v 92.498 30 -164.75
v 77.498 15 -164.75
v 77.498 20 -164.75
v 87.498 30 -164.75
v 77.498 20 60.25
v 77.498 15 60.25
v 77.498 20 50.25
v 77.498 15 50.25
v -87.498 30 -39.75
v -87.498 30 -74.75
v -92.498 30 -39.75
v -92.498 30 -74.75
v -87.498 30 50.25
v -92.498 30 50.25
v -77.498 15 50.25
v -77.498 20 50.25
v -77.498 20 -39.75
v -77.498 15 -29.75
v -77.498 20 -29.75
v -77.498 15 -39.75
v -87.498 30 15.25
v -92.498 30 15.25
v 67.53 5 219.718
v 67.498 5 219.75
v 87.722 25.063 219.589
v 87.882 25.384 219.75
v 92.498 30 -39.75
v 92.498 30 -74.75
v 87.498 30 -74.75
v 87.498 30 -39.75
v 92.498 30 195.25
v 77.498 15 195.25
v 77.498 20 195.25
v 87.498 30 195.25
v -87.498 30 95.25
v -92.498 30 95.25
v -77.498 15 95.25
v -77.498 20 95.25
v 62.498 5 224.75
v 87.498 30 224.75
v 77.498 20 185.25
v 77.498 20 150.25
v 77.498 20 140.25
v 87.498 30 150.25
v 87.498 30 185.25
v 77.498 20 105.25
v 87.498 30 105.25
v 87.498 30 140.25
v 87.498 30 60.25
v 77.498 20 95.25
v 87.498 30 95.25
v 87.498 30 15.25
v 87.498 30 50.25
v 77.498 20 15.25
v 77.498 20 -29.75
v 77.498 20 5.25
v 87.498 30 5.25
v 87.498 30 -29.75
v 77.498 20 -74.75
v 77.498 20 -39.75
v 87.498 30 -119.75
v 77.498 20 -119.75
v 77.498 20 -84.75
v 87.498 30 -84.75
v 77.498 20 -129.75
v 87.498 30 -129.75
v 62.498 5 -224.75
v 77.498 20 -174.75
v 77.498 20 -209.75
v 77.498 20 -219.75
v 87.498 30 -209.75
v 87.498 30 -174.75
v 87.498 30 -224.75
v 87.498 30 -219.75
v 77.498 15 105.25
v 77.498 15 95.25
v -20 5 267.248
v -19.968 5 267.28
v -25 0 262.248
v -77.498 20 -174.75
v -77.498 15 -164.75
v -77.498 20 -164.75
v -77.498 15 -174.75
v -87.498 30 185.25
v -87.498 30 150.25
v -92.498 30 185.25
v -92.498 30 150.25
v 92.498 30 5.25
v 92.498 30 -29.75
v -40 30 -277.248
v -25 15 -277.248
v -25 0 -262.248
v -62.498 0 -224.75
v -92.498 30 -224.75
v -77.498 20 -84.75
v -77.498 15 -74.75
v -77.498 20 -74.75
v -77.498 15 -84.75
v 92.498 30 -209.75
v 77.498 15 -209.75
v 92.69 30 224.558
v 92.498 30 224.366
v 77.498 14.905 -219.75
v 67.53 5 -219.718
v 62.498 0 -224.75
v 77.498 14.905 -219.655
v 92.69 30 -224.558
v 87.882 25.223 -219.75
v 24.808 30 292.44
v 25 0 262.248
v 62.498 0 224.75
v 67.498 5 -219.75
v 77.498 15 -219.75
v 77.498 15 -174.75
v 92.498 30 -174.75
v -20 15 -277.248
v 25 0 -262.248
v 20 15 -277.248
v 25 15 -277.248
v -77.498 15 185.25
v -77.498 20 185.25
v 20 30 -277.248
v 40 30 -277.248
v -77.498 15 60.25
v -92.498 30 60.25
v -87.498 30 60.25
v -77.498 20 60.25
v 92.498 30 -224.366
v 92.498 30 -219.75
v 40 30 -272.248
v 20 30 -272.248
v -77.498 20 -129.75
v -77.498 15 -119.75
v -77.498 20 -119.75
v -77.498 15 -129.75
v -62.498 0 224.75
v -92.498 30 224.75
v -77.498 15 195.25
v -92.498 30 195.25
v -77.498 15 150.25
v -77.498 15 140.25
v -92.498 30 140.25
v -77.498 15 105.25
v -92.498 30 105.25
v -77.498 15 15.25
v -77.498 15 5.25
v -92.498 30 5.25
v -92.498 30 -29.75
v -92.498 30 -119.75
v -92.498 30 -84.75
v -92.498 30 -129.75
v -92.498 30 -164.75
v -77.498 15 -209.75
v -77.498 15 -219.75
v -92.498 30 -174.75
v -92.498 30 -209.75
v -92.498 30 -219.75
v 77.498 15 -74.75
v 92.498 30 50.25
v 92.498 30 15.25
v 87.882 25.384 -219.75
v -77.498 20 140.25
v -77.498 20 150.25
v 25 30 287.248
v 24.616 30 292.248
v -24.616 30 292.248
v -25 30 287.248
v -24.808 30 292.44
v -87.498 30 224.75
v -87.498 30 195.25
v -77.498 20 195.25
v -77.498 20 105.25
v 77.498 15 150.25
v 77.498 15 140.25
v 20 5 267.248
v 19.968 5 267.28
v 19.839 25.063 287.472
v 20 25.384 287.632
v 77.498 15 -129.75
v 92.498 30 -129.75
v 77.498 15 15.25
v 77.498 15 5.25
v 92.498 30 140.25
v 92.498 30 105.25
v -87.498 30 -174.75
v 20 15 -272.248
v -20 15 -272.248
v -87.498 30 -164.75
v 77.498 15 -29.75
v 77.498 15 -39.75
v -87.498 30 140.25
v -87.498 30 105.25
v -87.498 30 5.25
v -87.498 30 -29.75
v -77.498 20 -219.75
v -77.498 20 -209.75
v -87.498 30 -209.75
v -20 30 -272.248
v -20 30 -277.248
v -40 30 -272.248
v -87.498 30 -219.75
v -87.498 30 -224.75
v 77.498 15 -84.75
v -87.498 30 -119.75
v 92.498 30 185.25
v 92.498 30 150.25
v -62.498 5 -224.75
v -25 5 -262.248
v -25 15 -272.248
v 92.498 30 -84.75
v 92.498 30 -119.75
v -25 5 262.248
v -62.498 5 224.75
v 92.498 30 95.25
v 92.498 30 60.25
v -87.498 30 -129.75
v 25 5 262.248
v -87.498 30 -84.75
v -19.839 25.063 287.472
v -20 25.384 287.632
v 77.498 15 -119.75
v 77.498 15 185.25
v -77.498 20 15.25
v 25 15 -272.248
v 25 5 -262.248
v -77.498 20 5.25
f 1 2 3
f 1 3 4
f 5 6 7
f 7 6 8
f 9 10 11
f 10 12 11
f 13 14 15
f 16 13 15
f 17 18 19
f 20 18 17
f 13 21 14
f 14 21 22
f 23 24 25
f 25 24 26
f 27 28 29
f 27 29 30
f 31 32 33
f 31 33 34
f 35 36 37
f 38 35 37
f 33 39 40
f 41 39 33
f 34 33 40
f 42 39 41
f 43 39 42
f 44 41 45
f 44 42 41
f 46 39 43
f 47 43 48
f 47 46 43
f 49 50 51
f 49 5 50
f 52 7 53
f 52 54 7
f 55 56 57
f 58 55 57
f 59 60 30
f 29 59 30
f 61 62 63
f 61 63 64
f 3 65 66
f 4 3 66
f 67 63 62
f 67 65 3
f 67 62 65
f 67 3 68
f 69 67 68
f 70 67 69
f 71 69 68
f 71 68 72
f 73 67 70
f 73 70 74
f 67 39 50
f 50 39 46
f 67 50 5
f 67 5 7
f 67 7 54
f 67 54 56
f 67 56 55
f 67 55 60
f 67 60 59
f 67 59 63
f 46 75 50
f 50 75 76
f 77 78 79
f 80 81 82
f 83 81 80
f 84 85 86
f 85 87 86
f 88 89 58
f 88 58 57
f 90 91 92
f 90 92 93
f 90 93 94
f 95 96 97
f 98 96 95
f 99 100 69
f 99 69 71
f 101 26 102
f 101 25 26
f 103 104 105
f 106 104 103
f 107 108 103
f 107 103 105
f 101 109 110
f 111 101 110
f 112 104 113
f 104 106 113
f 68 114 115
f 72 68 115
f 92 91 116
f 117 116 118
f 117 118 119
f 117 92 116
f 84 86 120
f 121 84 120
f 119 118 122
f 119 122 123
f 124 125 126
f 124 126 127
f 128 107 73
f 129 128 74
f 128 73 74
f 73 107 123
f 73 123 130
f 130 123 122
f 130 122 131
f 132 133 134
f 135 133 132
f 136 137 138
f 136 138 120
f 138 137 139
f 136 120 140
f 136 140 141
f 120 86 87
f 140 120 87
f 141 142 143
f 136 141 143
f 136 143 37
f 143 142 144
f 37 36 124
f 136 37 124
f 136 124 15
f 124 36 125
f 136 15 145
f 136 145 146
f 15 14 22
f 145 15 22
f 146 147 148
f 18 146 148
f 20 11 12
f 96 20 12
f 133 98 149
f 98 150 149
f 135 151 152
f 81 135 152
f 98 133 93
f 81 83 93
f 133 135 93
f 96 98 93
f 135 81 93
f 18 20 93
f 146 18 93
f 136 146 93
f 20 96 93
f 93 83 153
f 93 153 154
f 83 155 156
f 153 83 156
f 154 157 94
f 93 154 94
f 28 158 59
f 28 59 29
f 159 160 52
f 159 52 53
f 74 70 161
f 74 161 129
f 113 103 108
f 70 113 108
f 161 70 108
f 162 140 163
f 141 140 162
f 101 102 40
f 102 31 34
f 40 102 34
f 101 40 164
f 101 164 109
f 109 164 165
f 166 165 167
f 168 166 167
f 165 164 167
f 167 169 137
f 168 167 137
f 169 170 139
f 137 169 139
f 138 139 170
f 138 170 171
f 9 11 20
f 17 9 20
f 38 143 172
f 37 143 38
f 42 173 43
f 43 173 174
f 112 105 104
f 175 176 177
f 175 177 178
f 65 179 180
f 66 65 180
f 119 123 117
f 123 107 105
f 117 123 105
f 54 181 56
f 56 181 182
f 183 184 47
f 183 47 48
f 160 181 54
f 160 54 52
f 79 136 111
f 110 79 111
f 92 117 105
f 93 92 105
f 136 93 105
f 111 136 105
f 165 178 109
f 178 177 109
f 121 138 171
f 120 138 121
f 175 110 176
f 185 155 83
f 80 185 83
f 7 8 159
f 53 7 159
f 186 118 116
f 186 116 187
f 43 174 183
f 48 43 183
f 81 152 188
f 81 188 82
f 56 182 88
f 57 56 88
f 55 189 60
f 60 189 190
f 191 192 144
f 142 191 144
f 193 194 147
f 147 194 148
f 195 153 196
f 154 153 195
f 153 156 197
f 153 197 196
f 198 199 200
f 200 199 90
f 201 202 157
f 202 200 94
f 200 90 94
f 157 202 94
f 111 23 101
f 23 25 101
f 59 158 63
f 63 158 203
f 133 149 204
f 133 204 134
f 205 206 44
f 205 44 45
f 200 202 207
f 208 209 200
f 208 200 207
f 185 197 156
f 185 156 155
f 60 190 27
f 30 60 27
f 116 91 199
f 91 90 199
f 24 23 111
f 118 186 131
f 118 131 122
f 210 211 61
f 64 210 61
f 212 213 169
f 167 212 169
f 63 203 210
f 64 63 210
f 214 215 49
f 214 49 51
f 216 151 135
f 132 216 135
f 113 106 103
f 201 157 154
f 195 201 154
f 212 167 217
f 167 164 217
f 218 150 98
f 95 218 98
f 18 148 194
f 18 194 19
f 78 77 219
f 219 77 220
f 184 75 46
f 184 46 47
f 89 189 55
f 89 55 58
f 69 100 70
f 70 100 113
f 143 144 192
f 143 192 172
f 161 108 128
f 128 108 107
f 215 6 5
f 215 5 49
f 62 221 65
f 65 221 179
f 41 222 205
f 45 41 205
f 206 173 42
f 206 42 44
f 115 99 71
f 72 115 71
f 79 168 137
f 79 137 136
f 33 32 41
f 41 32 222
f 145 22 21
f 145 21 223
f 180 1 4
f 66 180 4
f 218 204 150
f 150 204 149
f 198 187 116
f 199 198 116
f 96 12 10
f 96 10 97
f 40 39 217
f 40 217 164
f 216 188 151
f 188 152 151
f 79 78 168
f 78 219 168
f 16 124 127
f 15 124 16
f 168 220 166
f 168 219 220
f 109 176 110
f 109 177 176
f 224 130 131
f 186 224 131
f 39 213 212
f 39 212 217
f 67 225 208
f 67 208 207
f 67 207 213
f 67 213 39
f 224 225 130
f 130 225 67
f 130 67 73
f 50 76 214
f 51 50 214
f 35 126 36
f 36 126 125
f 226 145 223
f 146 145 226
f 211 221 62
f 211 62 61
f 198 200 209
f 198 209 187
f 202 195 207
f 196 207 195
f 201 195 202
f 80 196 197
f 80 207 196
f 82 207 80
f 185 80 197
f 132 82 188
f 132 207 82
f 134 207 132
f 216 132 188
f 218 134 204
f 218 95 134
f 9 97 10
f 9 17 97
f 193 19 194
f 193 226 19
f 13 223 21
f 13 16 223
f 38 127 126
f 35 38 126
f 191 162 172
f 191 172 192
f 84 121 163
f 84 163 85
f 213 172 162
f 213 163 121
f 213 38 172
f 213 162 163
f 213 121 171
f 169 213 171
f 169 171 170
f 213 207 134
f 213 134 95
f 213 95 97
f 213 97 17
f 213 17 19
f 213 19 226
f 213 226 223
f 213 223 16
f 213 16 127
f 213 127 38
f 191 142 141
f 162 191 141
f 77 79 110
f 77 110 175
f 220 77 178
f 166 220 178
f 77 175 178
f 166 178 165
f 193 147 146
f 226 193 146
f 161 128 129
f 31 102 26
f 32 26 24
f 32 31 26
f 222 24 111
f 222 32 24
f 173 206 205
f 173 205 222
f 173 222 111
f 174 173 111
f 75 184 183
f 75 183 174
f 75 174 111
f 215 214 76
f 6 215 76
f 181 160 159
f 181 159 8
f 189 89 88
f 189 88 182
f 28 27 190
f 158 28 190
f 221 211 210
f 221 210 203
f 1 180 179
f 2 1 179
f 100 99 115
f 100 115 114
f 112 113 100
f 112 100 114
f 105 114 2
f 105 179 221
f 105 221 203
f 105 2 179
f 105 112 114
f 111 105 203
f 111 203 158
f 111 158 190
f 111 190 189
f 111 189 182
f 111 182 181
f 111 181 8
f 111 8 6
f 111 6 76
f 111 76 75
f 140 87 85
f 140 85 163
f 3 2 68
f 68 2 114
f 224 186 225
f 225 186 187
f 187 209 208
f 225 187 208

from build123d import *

# Parameters (mm, degrees)
BOSS_EXTRUDE1_DEPTH     = 5
BOSS_EXTRUDE2_DEPTH     = 224.75
BOSS_EXTRUDE3_DEPTH     = 25
SKETCH7_W               = 5
SKETCH7_H               = 5
BOSS_EXTRUDE5_DEPTH     = 15
BOSS_EXTRUDE6_DEPTH     = 50
BOSS_EXTRUDE7_DEPTH     = 48
BOSS_EXTRUDE8_DEPTH     = 48
BOSS_EXTRUDE9_DEPTH     = 48
CUT_EXTRUDE1_DEPTH      = 95.104275362
CUT_EXTRUDE1_DEPTH_BACK = 93.6900618
SKETCH20_W              = 50
SKETCH20_H              = 48.112885627
CUT_EXTRUDE2_DEPTH      = 105
CUT_EXTRUDE3_DEPTH      = 105
BOSS_EXTRUDE11_DEPTH    = 5
CUT_EXTRUDE4_DEPTH      = 293.4400618
CUT_EXTRUDE4_DEPTH_BACK = 278.247872606
CUT_EXTRUDE5_DEPTH      = 29
SKETCH25_W              = 15
SKETCH25_H              = 10
CUT_EXTRUDE6_DEPTH      = 26
CUT_EXTRUDE6_DEPTH_BACK = 6


with BuildPart() as part:
    # Sketch1 → Boss-Extrude1 (new body)
    with BuildSketch(Plane(origin=(0, 0, 0), x_dir=(1, 0, 0), z_dir=(0, 1, 0))):
        Polygon((62.497872606, -224.75), (62.497872606, 224.75), (25, 262.247872606), (-25, 262.247872606), (-62.497872606, 224.75), (-62.497872606, -224.75), (-25, -262.247872606), (25, -262.247872606), align=None)
    extrude(amount=BOSS_EXTRUDE1_DEPTH)

    # Sketch3 → Boss-Extrude2 (add, symmetric)
    with BuildSketch(Plane(origin=(0, 0, 0), x_dir=(0, -1, 0), z_dir=(0, 0, 1))):
        Polygon((0, 62.497872606), (-5, 62.497872606), (-30, 87.497872606), (-30, 92.497872606), align=None)
        Polygon((-30, -87.497872606), (-30, -92.497872606), (0, -62.497872606), (-5, -62.497872606), align=None)
    extrude(amount=BOSS_EXTRUDE2_DEPTH, both=True)

    # Sketch6 → Boss-Extrude3 (add, symmetric)
    with BuildSketch(Plane(origin=(0, 0, 0), x_dir=(0, -1, 0), z_dir=(-1, 0, 0))):
        Polygon((0, 262.247872606), (-30, 292.247872606), (-30, 287.247872606), (-5, 262.247872606), align=None)
        Polygon((0, -262.247872606), (-15, -277.247872606), (-15, -272.247872606), (-5, -262.247872606), align=None)
    extrude(amount=BOSS_EXTRUDE3_DEPTH, both=True)

    # Sketch7 → Boss-Extrude5 (add)
    with BuildSketch(Plane(origin=(0, 15, 0), x_dir=(1, 0, 0), z_dir=(0, 1, 0))):
        with Locations((-22.5, 274.747872606)):
            Rectangle(SKETCH7_W, SKETCH7_H)
        with Locations((22.5, 274.747872606)):
            Rectangle(SKETCH7_W, SKETCH7_H)
    extrude(amount=BOSS_EXTRUDE5_DEPTH)

    # Sketch10 → Boss-Extrude6 (add, symmetric)
    with BuildSketch(Plane(origin=(99.875, 0, -99.875), x_dir=(0, -1, 0), z_dir=(0.707106781, 0, -0.707106781))):
        Polygon((0, 203.114918601), (-30, 224.328122037), (-30, 220.792588131), (-5, 203.114918601), align=None)
    extrude(amount=BOSS_EXTRUDE6_DEPTH, both=True)

    # Sketch13 → Boss-Extrude7 (add, symmetric)
    with BuildSketch(Plane(origin=(-99.875, 0, -99.875), x_dir=(0, -1, 0), z_dir=(0.707106781, 0, 0.707106781))):
        Polygon((-5, 203.114918601), (-30, 220.792588131), (-30, 224.328122037), (0, 203.114918601), align=None)
    extrude(amount=BOSS_EXTRUDE7_DEPTH, both=True)

    # Sketch15 → Boss-Extrude8 (add, symmetric)
    with BuildSketch(Plane(origin=(-99.875, 0, 99.875), x_dir=(0, -1, 0), z_dir=(-0.707106781, 0, 0.707106781))):
        Polygon((-5, 203.114918601), (-30, 220.792588131), (-30, 224.328122037), (0, 203.114918601), align=None)
    extrude(amount=BOSS_EXTRUDE8_DEPTH, both=True)

    # Sketch17 → Boss-Extrude9 (add, symmetric)
    with BuildSketch(Plane(origin=(99.875, 0, 99.875), x_dir=(0, -1, 0), z_dir=(-0.707106781, 0, -0.707106781))):
        Polygon((-5, 203.114918601), (-30, 220.792588131), (-30, 224.328122037), (0, 203.114918601), align=None)
    extrude(amount=BOSS_EXTRUDE9_DEPTH, both=True)

    # Sketch18 → Cut-Extrude1 (cut, two sides)
    with BuildSketch(Plane(origin=(0, 0, 0), x_dir=(0, -1, 0), z_dir=(-1, 0, 0))) as cut_extrude1_sk:
        Polygon((0, 262.247872606), (-30, 292.4400618), (0, 277.4400618), align=None)
    extrude(amount=CUT_EXTRUDE1_DEPTH, mode=Mode.SUBTRACT)
    extrude(cut_extrude1_sk.sketch, amount=-CUT_EXTRUDE1_DEPTH_BACK, mode=Mode.SUBTRACT)

    # Sketch20 → Cut-Extrude2 (cut)
    with BuildSketch(Plane(origin=(0, -131.123936303, -131.123936303), x_dir=(1, 0, 0), z_dir=(0, -0.707106781, -0.707106781))):
        with Locations((0, -209.493691886)):
            Rectangle(SKETCH20_W, SKETCH20_H)
    extrude(amount=CUT_EXTRUDE2_DEPTH, mode=Mode.SUBTRACT)

    # Sketch21 → Cut-Extrude3 (cut)
    with BuildSketch(Plane(origin=(0, 0, -277.247872606), x_dir=(-1, 0, 0), z_dir=(0, 0, -1))):
        Polygon((20, 15), (-53.678843976, 15), (-53.678843976, 30), (47.571265033, 30), (47.571265033, 15), align=None)
    extrude(amount=CUT_EXTRUDE3_DEPTH, mode=Mode.SUBTRACT)

    # Sketch22 → Boss-Extrude11 (add)
    with BuildSketch(Plane(origin=(0, 0, -277.247872606), x_dir=(-1, 0, 0), z_dir=(0, 0, -1))):
        Polygon((-40, 30), (-25, 15), (-20, 15), (-20, 30), align=None)
        Polygon((20, 30), (40, 30), (25, 15), (20, 15), align=None)
    extrude(amount=-BOSS_EXTRUDE11_DEPTH)

    # Sketch23 → Cut-Extrude4 (cut, two sides)
    with BuildSketch(Plane(origin=(0, 0, 0), x_dir=(0, -1, 0), z_dir=(0, 0, 1))) as cut_extrude4_sk:
        Polygon((0, 62.497872606), (-30, 92.6900618), (0, 77.6900618), align=None)
    extrude(amount=CUT_EXTRUDE4_DEPTH, mode=Mode.SUBTRACT)
    extrude(cut_extrude4_sk.sketch, amount=-CUT_EXTRUDE4_DEPTH_BACK, mode=Mode.SUBTRACT)

    # Sketch24 → Cut-Extrude5 (cut)
    with BuildSketch(Plane(origin=(-31.248936303, -31.248936303, 0), x_dir=(0, 0, 1), z_dir=(-0.707106781, -0.707106781, 0))):
        Polygon((-224.75, 44.19266953), (-259.614343039, 44.19266953), (-259.614343039, 90.205869936), (275.937456007, 90.205869936), (275.937456007, 44.19266953), align=None)
    extrude(amount=CUT_EXTRUDE5_DEPTH, mode=Mode.SUBTRACT)

    # Sketch25 → Cut-Extrude6 (cut, two sides)
    with BuildSketch(Plane(origin=(0, 5, 0), x_dir=(1, 0, 0), z_dir=(0, 1, 0))) as cut_extrude6_sk:
        with Locations((84.997872606, 214.75)):
            Rectangle(SKETCH25_W, SKETCH25_H)
        with Locations((84.997872606, 169.75)):
            Rectangle(SKETCH25_W, SKETCH25_H)
        with Locations((84.997872606, 124.75)):
            Rectangle(SKETCH25_W, SKETCH25_H)
        with Locations((84.997872606, 79.75)):
            Rectangle(SKETCH25_W, SKETCH25_H)
        with Locations((84.997872606, 34.75)):
            Rectangle(SKETCH25_W, SKETCH25_H)
        with Locations((84.997872606, -10.25)):
            Rectangle(SKETCH25_W, SKETCH25_H)
        with Locations((84.997872606, -55.25)):
            Rectangle(SKETCH25_W, SKETCH25_H)
        with Locations((84.997872606, -190.25)):
            Rectangle(SKETCH25_W, SKETCH25_H)
        with Locations((84.997872606, -145.25)):
            Rectangle(SKETCH25_W, SKETCH25_H)
        with Locations((84.997872606, -100.25)):
            Rectangle(SKETCH25_W, SKETCH25_H)
        with Locations((-84.997872606, -190.25)):
            Rectangle(SKETCH25_W, SKETCH25_H)
        with Locations((-84.997872606, -145.25)):
            Rectangle(SKETCH25_W, SKETCH25_H)
        with Locations((-84.997872606, -100.25)):
            Rectangle(SKETCH25_W, SKETCH25_H)
        with Locations((-84.997872606, -55.25)):
            Rectangle(SKETCH25_W, SKETCH25_H)
        with Locations((-84.997872606, 34.75)):
            Rectangle(SKETCH25_W, SKETCH25_H)
        with Locations((-84.997872606, 214.75)):
            Rectangle(SKETCH25_W, SKETCH25_H)
        with Locations((-84.997872606, 169.75)):
            Rectangle(SKETCH25_W, SKETCH25_H)
        with Locations((-84.997872606, 124.75)):
            Rectangle(SKETCH25_W, SKETCH25_H)
        with Locations((-84.997872606, 79.75)):
            Rectangle(SKETCH25_W, SKETCH25_H)
        with Locations((-84.997872606, -10.25)):
            Rectangle(SKETCH25_W, SKETCH25_H)
    extrude(amount=CUT_EXTRUDE6_DEPTH, mode=Mode.SUBTRACT)
    extrude(cut_extrude6_sk.sketch, amount=-CUT_EXTRUDE6_DEPTH_BACK, mode=Mode.SUBTRACT)


solid = part.part
